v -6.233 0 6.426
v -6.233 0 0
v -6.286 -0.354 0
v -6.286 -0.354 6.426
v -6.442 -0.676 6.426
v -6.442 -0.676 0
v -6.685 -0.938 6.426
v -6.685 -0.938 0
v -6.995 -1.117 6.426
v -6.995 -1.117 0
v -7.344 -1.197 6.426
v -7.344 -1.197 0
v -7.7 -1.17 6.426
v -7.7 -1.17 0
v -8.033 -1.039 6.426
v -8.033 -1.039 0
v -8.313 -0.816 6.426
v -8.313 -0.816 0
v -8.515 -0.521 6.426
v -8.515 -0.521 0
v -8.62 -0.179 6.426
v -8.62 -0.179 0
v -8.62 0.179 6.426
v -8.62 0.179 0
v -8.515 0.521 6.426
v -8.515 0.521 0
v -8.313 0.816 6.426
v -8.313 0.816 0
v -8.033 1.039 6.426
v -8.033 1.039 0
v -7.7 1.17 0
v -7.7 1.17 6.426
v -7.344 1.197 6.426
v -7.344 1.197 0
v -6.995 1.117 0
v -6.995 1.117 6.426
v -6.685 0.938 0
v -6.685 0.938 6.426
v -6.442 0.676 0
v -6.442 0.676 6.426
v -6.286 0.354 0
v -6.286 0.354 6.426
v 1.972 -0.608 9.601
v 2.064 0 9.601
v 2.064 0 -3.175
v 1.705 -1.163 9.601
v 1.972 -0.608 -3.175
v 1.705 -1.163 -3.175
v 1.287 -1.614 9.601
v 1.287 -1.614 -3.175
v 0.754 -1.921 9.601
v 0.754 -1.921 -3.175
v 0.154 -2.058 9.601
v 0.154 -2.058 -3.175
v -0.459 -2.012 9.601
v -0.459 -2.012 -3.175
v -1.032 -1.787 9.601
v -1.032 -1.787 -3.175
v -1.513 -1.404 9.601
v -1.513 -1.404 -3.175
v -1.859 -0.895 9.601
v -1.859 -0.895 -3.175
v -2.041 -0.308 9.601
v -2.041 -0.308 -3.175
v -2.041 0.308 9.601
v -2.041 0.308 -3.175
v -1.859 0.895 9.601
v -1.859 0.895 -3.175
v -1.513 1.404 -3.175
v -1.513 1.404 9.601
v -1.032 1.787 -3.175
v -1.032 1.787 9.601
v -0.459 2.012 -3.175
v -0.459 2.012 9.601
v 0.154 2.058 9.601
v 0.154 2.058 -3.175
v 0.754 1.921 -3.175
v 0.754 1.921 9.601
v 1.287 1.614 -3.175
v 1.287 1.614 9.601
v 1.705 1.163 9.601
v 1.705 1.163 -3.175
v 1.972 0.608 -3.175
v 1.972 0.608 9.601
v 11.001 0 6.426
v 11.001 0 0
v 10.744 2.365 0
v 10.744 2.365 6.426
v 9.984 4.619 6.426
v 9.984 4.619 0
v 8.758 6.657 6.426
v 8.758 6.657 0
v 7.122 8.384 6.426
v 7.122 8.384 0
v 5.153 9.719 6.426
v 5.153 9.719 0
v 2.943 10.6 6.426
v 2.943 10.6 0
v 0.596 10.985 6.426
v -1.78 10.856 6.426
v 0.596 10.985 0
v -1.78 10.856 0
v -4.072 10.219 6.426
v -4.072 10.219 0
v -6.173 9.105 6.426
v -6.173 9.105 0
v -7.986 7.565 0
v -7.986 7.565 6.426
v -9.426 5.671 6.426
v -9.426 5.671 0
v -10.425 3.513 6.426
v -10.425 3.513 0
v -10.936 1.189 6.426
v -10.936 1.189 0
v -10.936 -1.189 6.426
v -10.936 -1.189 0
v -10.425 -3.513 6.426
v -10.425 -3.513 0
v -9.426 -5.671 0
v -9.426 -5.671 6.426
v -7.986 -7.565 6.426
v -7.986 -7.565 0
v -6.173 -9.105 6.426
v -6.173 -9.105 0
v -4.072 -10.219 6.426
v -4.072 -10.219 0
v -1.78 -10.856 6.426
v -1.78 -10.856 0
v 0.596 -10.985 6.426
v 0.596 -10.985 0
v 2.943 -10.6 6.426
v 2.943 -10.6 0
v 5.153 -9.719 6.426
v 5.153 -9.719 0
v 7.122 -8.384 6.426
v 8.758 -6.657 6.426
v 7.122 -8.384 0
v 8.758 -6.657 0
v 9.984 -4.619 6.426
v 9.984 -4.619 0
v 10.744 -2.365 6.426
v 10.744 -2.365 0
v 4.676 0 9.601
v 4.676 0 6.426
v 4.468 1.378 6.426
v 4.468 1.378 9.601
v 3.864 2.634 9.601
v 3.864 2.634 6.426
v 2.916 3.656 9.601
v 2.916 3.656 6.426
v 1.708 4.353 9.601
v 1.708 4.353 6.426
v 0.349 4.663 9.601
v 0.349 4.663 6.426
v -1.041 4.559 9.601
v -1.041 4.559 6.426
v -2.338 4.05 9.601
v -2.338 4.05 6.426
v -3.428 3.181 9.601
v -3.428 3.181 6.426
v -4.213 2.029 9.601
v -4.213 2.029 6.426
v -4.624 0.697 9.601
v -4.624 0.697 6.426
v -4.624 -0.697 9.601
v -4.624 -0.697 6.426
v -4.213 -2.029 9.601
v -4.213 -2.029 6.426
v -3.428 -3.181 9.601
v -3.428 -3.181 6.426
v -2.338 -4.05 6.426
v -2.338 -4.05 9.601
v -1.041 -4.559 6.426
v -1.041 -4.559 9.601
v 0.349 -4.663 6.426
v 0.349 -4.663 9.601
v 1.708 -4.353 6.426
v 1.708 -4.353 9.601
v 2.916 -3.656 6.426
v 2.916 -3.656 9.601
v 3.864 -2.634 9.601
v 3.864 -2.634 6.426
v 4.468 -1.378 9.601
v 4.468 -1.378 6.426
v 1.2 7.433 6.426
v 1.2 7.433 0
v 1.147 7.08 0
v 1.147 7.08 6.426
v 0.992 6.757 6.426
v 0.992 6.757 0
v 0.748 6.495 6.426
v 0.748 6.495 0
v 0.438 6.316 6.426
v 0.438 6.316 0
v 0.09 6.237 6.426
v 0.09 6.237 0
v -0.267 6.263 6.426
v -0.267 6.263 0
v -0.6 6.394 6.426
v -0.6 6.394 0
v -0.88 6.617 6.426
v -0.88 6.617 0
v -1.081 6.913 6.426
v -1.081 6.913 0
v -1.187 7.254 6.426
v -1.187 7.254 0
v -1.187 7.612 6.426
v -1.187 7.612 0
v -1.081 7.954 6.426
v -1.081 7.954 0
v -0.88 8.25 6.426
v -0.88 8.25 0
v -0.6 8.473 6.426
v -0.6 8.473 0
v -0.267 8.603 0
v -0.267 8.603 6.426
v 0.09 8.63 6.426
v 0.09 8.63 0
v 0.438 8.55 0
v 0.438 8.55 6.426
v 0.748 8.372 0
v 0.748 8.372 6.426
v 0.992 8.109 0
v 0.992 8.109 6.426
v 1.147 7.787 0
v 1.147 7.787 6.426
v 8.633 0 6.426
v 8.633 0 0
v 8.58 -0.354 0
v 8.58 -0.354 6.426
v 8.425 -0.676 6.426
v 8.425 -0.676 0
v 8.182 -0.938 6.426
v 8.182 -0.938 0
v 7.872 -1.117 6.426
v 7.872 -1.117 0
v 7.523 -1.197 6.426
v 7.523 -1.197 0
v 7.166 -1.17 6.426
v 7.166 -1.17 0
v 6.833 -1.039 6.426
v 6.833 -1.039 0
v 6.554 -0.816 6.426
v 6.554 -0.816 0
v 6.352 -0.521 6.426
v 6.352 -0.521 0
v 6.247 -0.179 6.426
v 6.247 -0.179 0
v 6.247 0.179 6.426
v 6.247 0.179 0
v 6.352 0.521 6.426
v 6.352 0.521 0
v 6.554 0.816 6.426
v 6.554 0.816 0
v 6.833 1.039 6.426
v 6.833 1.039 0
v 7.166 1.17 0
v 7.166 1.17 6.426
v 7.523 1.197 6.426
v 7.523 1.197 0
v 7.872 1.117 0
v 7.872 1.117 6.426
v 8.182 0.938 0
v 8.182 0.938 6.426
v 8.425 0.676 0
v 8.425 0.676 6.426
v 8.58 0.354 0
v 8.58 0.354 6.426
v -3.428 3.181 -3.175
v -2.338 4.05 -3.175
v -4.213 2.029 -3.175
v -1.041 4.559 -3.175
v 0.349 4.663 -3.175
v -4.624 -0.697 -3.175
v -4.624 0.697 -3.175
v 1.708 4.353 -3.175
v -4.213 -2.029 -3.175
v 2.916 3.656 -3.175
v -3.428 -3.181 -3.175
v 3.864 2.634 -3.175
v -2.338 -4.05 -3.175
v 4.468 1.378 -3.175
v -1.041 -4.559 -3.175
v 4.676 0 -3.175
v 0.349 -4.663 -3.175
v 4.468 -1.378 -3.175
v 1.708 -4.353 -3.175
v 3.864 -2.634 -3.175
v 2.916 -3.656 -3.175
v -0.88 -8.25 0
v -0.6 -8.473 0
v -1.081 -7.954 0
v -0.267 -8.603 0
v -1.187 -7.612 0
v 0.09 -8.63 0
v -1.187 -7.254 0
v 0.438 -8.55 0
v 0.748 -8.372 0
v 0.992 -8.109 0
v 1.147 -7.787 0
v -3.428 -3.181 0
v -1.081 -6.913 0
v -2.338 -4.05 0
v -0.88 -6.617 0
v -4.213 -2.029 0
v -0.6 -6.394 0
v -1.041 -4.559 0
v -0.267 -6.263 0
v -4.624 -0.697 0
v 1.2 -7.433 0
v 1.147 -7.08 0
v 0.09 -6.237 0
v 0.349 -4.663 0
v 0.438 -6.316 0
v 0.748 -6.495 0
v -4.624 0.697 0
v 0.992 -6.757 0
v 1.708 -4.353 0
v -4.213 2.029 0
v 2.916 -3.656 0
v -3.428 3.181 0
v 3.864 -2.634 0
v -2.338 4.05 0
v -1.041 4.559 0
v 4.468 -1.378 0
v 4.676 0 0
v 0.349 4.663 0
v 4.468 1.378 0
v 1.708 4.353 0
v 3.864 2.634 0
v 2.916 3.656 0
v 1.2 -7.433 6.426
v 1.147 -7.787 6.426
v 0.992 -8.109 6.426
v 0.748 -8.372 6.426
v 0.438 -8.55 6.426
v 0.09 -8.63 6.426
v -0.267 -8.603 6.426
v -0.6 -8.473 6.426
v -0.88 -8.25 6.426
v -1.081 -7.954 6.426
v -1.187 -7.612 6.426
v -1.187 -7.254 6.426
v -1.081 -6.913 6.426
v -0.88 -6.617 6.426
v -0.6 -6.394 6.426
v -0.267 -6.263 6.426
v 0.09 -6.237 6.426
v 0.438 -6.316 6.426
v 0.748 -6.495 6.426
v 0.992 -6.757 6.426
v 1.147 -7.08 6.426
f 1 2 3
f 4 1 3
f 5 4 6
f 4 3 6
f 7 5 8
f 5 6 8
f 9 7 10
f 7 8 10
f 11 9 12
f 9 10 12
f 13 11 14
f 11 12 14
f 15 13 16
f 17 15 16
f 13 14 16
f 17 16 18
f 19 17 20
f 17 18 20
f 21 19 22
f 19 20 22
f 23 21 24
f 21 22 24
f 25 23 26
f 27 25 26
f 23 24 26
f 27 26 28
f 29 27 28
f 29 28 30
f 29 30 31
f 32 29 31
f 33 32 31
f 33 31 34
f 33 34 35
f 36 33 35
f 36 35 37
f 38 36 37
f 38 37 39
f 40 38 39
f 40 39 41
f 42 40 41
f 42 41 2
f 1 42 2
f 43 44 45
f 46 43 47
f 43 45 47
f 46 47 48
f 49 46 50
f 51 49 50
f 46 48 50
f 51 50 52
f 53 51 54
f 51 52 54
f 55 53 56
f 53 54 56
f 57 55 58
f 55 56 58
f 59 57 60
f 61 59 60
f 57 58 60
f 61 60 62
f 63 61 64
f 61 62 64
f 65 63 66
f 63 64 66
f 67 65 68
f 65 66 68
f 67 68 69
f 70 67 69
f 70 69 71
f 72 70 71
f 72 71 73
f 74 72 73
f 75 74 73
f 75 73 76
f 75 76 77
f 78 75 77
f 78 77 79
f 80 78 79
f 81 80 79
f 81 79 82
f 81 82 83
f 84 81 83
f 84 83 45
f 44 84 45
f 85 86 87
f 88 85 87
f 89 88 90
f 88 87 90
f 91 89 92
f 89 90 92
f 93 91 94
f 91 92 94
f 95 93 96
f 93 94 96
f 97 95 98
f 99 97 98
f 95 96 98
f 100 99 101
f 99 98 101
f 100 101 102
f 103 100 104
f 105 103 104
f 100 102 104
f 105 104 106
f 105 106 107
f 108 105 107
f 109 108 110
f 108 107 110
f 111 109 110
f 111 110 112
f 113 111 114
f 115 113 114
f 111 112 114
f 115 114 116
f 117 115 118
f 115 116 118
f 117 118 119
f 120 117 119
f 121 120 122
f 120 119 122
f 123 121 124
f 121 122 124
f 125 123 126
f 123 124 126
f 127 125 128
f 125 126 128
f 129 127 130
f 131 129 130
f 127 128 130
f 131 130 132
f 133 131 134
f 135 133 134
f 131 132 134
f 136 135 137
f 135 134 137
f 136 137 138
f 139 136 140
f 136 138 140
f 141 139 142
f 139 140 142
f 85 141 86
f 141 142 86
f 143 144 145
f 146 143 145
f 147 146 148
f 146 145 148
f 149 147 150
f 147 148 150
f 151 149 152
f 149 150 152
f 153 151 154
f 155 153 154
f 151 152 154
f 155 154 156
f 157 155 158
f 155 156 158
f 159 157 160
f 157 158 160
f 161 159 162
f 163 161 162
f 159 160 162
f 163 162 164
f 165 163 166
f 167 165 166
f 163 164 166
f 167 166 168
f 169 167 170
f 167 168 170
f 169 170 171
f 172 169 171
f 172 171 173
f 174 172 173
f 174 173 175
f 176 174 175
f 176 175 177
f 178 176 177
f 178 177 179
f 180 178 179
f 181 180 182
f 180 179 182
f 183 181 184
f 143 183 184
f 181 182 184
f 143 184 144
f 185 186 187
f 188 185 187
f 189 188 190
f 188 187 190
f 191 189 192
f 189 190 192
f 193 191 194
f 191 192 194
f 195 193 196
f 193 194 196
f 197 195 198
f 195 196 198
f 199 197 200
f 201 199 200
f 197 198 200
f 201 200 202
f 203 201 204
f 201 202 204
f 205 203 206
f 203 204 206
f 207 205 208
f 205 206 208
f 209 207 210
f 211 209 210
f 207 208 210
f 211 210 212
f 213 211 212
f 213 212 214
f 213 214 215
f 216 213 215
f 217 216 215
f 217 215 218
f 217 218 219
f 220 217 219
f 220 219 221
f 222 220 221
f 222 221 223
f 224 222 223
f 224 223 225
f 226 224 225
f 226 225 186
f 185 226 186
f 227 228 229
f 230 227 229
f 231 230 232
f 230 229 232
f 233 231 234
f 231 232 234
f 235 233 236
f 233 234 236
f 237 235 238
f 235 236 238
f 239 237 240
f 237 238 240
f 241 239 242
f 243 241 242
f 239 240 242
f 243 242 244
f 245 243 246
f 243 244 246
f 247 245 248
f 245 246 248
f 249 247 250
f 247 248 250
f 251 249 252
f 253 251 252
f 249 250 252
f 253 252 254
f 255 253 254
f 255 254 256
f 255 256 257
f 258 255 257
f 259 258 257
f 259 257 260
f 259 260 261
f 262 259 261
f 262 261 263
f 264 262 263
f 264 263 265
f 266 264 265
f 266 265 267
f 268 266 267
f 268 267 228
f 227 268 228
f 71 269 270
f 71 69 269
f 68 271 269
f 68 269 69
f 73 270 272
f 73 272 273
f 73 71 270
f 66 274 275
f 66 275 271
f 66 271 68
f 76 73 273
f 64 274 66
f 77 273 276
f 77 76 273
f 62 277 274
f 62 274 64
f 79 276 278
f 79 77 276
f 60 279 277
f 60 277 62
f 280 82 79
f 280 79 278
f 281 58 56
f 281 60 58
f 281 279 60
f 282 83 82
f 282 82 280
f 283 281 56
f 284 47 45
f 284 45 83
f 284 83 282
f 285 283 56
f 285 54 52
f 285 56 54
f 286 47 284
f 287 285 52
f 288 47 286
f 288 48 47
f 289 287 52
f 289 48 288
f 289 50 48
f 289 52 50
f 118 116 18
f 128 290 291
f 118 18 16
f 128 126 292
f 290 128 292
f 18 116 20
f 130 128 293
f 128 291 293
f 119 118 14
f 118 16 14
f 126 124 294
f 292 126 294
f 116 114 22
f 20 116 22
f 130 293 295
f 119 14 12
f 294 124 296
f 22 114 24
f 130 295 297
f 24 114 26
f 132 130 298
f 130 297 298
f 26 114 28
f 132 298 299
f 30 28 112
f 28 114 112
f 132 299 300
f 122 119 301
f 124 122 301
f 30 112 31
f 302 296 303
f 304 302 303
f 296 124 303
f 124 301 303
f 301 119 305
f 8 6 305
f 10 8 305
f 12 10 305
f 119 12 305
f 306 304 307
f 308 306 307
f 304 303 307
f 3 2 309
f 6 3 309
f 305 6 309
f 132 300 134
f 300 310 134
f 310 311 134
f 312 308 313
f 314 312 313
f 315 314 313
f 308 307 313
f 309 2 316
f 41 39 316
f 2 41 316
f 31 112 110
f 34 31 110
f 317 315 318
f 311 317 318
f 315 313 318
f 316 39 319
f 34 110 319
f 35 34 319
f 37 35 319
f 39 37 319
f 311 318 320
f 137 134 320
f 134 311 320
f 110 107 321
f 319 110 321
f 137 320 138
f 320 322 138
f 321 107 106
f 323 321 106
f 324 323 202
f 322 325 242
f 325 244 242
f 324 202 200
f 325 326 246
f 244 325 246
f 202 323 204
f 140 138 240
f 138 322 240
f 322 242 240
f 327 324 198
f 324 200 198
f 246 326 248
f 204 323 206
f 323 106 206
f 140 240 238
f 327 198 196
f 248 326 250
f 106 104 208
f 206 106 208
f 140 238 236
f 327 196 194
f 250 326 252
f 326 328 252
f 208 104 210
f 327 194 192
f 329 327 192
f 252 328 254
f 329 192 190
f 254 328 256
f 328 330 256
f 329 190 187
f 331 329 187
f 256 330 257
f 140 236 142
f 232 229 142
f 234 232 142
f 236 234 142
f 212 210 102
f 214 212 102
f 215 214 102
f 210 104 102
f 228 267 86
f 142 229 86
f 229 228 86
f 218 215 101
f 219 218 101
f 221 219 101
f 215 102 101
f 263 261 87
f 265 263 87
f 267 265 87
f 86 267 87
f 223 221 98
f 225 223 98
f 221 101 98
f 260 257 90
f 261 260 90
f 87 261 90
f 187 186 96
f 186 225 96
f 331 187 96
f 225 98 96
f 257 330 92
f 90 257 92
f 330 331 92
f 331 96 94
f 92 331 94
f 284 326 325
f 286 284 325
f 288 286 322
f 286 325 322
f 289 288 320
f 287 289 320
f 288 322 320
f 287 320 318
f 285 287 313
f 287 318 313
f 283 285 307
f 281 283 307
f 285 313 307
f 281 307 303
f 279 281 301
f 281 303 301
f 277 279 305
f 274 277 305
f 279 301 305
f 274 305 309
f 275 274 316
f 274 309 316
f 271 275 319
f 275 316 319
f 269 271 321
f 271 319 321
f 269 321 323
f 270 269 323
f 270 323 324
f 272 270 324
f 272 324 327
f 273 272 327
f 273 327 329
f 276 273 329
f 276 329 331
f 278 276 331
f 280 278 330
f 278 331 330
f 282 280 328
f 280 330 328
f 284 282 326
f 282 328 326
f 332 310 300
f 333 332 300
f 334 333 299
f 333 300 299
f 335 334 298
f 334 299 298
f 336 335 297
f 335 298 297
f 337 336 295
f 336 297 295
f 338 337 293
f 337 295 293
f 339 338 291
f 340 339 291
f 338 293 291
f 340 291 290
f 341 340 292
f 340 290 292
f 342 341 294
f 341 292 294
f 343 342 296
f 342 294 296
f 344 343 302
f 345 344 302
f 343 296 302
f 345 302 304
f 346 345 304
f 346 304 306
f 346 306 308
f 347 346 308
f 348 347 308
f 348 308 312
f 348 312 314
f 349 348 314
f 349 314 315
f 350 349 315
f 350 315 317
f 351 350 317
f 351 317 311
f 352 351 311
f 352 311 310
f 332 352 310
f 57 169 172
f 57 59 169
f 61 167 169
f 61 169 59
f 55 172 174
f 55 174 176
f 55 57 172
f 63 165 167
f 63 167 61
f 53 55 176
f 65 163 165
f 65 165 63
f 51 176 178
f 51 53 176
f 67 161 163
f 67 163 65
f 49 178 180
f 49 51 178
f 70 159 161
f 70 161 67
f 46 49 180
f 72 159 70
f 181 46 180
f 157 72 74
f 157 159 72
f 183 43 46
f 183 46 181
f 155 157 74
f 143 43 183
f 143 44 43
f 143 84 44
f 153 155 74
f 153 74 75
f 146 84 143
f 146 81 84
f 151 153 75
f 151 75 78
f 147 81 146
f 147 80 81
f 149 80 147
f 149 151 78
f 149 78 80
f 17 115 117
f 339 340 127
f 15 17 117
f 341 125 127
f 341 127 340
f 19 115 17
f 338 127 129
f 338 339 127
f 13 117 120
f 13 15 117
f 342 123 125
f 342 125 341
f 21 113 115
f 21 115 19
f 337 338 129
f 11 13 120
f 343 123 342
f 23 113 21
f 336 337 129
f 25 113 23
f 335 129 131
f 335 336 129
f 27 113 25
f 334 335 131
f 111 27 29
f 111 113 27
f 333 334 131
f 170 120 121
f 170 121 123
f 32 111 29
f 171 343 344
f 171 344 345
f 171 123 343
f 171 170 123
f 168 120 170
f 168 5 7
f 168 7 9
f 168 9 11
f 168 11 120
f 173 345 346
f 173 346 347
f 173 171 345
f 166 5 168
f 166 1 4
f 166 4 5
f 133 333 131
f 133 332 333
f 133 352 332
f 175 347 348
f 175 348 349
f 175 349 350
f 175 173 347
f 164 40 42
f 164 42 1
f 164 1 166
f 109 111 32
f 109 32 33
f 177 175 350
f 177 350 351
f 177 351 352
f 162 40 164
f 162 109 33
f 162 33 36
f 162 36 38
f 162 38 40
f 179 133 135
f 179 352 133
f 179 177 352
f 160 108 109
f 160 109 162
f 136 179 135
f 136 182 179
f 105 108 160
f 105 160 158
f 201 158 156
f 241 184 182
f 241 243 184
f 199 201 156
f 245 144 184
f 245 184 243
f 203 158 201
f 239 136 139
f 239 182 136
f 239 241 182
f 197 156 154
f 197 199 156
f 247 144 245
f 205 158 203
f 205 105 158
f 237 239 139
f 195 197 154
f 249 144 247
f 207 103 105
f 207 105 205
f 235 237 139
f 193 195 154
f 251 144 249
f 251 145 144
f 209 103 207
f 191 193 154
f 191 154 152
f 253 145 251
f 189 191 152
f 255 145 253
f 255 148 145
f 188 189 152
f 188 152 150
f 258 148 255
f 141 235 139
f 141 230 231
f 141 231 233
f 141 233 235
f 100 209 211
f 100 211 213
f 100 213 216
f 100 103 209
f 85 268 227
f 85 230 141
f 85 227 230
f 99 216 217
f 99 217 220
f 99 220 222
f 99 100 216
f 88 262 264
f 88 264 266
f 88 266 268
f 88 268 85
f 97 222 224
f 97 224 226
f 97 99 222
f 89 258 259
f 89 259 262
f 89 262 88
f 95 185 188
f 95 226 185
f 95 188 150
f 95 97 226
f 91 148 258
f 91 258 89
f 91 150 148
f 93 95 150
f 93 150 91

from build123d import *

# Parameters (mm, degrees)
SKETCH_R        = 11.00074
PAD_DEPTH       = 6.4262
SKETCH001_R     = 4.67614
PAD001_DEPTH    = 3.175
SKETCH002_R     = 4.67614
PAD002_DEPTH    = 3.175
SKETCH003_R     = 2.06375
POCKET_DEPTH    = 12.7772
SKETCH004_R     = 1.20015
POCKET001_DEPTH = 9.6022


with BuildPart() as part:
    # Sketch → Pad (new body)
    with BuildSketch(Plane.XY):
        Circle(SKETCH_R)
    extrude(amount=PAD_DEPTH)

    # Sketch001 → Pad001 (new body)
    with BuildSketch(Plane.XY.offset(6.4262)):
        Circle(SKETCH001_R)
    extrude(amount=PAD001_DEPTH)

    # Sketch002 → Pad002 (new body)
    with BuildSketch(Plane(origin=(0, 0, 0), x_dir=(1, 0, 0), z_dir=(0, 0, -1))):
        Circle(SKETCH002_R)
    extrude(amount=PAD002_DEPTH)

    # Sketch003 → Pocket (cut, through all)
    with BuildSketch(Plane(origin=(0, 0, -3.175), x_dir=(1, 0, 0), z_dir=(0, 0, -1))):
        Circle(SKETCH003_R)
    extrude(amount=-POCKET_DEPTH, mode=Mode.SUBTRACT)

    # Sketch004 → Pocket001 (cut, through all)
    with BuildSketch(Plane(origin=(0, 0, 0), x_dir=(1, 0, 0), z_dir=(0, 0, -1))):
        with Locations((7.43331, 0)):
            Circle(SKETCH004_R)
        with Locations((0, -7.43331)):
            Circle(SKETCH004_R)
        with Locations((0, 7.43331)):
            Circle(SKETCH004_R)
        with Locations((-7.43331, 0)):
            Circle(SKETCH004_R)
    extrude(amount=-POCKET001_DEPTH, mode=Mode.SUBTRACT)


solid = part.part
